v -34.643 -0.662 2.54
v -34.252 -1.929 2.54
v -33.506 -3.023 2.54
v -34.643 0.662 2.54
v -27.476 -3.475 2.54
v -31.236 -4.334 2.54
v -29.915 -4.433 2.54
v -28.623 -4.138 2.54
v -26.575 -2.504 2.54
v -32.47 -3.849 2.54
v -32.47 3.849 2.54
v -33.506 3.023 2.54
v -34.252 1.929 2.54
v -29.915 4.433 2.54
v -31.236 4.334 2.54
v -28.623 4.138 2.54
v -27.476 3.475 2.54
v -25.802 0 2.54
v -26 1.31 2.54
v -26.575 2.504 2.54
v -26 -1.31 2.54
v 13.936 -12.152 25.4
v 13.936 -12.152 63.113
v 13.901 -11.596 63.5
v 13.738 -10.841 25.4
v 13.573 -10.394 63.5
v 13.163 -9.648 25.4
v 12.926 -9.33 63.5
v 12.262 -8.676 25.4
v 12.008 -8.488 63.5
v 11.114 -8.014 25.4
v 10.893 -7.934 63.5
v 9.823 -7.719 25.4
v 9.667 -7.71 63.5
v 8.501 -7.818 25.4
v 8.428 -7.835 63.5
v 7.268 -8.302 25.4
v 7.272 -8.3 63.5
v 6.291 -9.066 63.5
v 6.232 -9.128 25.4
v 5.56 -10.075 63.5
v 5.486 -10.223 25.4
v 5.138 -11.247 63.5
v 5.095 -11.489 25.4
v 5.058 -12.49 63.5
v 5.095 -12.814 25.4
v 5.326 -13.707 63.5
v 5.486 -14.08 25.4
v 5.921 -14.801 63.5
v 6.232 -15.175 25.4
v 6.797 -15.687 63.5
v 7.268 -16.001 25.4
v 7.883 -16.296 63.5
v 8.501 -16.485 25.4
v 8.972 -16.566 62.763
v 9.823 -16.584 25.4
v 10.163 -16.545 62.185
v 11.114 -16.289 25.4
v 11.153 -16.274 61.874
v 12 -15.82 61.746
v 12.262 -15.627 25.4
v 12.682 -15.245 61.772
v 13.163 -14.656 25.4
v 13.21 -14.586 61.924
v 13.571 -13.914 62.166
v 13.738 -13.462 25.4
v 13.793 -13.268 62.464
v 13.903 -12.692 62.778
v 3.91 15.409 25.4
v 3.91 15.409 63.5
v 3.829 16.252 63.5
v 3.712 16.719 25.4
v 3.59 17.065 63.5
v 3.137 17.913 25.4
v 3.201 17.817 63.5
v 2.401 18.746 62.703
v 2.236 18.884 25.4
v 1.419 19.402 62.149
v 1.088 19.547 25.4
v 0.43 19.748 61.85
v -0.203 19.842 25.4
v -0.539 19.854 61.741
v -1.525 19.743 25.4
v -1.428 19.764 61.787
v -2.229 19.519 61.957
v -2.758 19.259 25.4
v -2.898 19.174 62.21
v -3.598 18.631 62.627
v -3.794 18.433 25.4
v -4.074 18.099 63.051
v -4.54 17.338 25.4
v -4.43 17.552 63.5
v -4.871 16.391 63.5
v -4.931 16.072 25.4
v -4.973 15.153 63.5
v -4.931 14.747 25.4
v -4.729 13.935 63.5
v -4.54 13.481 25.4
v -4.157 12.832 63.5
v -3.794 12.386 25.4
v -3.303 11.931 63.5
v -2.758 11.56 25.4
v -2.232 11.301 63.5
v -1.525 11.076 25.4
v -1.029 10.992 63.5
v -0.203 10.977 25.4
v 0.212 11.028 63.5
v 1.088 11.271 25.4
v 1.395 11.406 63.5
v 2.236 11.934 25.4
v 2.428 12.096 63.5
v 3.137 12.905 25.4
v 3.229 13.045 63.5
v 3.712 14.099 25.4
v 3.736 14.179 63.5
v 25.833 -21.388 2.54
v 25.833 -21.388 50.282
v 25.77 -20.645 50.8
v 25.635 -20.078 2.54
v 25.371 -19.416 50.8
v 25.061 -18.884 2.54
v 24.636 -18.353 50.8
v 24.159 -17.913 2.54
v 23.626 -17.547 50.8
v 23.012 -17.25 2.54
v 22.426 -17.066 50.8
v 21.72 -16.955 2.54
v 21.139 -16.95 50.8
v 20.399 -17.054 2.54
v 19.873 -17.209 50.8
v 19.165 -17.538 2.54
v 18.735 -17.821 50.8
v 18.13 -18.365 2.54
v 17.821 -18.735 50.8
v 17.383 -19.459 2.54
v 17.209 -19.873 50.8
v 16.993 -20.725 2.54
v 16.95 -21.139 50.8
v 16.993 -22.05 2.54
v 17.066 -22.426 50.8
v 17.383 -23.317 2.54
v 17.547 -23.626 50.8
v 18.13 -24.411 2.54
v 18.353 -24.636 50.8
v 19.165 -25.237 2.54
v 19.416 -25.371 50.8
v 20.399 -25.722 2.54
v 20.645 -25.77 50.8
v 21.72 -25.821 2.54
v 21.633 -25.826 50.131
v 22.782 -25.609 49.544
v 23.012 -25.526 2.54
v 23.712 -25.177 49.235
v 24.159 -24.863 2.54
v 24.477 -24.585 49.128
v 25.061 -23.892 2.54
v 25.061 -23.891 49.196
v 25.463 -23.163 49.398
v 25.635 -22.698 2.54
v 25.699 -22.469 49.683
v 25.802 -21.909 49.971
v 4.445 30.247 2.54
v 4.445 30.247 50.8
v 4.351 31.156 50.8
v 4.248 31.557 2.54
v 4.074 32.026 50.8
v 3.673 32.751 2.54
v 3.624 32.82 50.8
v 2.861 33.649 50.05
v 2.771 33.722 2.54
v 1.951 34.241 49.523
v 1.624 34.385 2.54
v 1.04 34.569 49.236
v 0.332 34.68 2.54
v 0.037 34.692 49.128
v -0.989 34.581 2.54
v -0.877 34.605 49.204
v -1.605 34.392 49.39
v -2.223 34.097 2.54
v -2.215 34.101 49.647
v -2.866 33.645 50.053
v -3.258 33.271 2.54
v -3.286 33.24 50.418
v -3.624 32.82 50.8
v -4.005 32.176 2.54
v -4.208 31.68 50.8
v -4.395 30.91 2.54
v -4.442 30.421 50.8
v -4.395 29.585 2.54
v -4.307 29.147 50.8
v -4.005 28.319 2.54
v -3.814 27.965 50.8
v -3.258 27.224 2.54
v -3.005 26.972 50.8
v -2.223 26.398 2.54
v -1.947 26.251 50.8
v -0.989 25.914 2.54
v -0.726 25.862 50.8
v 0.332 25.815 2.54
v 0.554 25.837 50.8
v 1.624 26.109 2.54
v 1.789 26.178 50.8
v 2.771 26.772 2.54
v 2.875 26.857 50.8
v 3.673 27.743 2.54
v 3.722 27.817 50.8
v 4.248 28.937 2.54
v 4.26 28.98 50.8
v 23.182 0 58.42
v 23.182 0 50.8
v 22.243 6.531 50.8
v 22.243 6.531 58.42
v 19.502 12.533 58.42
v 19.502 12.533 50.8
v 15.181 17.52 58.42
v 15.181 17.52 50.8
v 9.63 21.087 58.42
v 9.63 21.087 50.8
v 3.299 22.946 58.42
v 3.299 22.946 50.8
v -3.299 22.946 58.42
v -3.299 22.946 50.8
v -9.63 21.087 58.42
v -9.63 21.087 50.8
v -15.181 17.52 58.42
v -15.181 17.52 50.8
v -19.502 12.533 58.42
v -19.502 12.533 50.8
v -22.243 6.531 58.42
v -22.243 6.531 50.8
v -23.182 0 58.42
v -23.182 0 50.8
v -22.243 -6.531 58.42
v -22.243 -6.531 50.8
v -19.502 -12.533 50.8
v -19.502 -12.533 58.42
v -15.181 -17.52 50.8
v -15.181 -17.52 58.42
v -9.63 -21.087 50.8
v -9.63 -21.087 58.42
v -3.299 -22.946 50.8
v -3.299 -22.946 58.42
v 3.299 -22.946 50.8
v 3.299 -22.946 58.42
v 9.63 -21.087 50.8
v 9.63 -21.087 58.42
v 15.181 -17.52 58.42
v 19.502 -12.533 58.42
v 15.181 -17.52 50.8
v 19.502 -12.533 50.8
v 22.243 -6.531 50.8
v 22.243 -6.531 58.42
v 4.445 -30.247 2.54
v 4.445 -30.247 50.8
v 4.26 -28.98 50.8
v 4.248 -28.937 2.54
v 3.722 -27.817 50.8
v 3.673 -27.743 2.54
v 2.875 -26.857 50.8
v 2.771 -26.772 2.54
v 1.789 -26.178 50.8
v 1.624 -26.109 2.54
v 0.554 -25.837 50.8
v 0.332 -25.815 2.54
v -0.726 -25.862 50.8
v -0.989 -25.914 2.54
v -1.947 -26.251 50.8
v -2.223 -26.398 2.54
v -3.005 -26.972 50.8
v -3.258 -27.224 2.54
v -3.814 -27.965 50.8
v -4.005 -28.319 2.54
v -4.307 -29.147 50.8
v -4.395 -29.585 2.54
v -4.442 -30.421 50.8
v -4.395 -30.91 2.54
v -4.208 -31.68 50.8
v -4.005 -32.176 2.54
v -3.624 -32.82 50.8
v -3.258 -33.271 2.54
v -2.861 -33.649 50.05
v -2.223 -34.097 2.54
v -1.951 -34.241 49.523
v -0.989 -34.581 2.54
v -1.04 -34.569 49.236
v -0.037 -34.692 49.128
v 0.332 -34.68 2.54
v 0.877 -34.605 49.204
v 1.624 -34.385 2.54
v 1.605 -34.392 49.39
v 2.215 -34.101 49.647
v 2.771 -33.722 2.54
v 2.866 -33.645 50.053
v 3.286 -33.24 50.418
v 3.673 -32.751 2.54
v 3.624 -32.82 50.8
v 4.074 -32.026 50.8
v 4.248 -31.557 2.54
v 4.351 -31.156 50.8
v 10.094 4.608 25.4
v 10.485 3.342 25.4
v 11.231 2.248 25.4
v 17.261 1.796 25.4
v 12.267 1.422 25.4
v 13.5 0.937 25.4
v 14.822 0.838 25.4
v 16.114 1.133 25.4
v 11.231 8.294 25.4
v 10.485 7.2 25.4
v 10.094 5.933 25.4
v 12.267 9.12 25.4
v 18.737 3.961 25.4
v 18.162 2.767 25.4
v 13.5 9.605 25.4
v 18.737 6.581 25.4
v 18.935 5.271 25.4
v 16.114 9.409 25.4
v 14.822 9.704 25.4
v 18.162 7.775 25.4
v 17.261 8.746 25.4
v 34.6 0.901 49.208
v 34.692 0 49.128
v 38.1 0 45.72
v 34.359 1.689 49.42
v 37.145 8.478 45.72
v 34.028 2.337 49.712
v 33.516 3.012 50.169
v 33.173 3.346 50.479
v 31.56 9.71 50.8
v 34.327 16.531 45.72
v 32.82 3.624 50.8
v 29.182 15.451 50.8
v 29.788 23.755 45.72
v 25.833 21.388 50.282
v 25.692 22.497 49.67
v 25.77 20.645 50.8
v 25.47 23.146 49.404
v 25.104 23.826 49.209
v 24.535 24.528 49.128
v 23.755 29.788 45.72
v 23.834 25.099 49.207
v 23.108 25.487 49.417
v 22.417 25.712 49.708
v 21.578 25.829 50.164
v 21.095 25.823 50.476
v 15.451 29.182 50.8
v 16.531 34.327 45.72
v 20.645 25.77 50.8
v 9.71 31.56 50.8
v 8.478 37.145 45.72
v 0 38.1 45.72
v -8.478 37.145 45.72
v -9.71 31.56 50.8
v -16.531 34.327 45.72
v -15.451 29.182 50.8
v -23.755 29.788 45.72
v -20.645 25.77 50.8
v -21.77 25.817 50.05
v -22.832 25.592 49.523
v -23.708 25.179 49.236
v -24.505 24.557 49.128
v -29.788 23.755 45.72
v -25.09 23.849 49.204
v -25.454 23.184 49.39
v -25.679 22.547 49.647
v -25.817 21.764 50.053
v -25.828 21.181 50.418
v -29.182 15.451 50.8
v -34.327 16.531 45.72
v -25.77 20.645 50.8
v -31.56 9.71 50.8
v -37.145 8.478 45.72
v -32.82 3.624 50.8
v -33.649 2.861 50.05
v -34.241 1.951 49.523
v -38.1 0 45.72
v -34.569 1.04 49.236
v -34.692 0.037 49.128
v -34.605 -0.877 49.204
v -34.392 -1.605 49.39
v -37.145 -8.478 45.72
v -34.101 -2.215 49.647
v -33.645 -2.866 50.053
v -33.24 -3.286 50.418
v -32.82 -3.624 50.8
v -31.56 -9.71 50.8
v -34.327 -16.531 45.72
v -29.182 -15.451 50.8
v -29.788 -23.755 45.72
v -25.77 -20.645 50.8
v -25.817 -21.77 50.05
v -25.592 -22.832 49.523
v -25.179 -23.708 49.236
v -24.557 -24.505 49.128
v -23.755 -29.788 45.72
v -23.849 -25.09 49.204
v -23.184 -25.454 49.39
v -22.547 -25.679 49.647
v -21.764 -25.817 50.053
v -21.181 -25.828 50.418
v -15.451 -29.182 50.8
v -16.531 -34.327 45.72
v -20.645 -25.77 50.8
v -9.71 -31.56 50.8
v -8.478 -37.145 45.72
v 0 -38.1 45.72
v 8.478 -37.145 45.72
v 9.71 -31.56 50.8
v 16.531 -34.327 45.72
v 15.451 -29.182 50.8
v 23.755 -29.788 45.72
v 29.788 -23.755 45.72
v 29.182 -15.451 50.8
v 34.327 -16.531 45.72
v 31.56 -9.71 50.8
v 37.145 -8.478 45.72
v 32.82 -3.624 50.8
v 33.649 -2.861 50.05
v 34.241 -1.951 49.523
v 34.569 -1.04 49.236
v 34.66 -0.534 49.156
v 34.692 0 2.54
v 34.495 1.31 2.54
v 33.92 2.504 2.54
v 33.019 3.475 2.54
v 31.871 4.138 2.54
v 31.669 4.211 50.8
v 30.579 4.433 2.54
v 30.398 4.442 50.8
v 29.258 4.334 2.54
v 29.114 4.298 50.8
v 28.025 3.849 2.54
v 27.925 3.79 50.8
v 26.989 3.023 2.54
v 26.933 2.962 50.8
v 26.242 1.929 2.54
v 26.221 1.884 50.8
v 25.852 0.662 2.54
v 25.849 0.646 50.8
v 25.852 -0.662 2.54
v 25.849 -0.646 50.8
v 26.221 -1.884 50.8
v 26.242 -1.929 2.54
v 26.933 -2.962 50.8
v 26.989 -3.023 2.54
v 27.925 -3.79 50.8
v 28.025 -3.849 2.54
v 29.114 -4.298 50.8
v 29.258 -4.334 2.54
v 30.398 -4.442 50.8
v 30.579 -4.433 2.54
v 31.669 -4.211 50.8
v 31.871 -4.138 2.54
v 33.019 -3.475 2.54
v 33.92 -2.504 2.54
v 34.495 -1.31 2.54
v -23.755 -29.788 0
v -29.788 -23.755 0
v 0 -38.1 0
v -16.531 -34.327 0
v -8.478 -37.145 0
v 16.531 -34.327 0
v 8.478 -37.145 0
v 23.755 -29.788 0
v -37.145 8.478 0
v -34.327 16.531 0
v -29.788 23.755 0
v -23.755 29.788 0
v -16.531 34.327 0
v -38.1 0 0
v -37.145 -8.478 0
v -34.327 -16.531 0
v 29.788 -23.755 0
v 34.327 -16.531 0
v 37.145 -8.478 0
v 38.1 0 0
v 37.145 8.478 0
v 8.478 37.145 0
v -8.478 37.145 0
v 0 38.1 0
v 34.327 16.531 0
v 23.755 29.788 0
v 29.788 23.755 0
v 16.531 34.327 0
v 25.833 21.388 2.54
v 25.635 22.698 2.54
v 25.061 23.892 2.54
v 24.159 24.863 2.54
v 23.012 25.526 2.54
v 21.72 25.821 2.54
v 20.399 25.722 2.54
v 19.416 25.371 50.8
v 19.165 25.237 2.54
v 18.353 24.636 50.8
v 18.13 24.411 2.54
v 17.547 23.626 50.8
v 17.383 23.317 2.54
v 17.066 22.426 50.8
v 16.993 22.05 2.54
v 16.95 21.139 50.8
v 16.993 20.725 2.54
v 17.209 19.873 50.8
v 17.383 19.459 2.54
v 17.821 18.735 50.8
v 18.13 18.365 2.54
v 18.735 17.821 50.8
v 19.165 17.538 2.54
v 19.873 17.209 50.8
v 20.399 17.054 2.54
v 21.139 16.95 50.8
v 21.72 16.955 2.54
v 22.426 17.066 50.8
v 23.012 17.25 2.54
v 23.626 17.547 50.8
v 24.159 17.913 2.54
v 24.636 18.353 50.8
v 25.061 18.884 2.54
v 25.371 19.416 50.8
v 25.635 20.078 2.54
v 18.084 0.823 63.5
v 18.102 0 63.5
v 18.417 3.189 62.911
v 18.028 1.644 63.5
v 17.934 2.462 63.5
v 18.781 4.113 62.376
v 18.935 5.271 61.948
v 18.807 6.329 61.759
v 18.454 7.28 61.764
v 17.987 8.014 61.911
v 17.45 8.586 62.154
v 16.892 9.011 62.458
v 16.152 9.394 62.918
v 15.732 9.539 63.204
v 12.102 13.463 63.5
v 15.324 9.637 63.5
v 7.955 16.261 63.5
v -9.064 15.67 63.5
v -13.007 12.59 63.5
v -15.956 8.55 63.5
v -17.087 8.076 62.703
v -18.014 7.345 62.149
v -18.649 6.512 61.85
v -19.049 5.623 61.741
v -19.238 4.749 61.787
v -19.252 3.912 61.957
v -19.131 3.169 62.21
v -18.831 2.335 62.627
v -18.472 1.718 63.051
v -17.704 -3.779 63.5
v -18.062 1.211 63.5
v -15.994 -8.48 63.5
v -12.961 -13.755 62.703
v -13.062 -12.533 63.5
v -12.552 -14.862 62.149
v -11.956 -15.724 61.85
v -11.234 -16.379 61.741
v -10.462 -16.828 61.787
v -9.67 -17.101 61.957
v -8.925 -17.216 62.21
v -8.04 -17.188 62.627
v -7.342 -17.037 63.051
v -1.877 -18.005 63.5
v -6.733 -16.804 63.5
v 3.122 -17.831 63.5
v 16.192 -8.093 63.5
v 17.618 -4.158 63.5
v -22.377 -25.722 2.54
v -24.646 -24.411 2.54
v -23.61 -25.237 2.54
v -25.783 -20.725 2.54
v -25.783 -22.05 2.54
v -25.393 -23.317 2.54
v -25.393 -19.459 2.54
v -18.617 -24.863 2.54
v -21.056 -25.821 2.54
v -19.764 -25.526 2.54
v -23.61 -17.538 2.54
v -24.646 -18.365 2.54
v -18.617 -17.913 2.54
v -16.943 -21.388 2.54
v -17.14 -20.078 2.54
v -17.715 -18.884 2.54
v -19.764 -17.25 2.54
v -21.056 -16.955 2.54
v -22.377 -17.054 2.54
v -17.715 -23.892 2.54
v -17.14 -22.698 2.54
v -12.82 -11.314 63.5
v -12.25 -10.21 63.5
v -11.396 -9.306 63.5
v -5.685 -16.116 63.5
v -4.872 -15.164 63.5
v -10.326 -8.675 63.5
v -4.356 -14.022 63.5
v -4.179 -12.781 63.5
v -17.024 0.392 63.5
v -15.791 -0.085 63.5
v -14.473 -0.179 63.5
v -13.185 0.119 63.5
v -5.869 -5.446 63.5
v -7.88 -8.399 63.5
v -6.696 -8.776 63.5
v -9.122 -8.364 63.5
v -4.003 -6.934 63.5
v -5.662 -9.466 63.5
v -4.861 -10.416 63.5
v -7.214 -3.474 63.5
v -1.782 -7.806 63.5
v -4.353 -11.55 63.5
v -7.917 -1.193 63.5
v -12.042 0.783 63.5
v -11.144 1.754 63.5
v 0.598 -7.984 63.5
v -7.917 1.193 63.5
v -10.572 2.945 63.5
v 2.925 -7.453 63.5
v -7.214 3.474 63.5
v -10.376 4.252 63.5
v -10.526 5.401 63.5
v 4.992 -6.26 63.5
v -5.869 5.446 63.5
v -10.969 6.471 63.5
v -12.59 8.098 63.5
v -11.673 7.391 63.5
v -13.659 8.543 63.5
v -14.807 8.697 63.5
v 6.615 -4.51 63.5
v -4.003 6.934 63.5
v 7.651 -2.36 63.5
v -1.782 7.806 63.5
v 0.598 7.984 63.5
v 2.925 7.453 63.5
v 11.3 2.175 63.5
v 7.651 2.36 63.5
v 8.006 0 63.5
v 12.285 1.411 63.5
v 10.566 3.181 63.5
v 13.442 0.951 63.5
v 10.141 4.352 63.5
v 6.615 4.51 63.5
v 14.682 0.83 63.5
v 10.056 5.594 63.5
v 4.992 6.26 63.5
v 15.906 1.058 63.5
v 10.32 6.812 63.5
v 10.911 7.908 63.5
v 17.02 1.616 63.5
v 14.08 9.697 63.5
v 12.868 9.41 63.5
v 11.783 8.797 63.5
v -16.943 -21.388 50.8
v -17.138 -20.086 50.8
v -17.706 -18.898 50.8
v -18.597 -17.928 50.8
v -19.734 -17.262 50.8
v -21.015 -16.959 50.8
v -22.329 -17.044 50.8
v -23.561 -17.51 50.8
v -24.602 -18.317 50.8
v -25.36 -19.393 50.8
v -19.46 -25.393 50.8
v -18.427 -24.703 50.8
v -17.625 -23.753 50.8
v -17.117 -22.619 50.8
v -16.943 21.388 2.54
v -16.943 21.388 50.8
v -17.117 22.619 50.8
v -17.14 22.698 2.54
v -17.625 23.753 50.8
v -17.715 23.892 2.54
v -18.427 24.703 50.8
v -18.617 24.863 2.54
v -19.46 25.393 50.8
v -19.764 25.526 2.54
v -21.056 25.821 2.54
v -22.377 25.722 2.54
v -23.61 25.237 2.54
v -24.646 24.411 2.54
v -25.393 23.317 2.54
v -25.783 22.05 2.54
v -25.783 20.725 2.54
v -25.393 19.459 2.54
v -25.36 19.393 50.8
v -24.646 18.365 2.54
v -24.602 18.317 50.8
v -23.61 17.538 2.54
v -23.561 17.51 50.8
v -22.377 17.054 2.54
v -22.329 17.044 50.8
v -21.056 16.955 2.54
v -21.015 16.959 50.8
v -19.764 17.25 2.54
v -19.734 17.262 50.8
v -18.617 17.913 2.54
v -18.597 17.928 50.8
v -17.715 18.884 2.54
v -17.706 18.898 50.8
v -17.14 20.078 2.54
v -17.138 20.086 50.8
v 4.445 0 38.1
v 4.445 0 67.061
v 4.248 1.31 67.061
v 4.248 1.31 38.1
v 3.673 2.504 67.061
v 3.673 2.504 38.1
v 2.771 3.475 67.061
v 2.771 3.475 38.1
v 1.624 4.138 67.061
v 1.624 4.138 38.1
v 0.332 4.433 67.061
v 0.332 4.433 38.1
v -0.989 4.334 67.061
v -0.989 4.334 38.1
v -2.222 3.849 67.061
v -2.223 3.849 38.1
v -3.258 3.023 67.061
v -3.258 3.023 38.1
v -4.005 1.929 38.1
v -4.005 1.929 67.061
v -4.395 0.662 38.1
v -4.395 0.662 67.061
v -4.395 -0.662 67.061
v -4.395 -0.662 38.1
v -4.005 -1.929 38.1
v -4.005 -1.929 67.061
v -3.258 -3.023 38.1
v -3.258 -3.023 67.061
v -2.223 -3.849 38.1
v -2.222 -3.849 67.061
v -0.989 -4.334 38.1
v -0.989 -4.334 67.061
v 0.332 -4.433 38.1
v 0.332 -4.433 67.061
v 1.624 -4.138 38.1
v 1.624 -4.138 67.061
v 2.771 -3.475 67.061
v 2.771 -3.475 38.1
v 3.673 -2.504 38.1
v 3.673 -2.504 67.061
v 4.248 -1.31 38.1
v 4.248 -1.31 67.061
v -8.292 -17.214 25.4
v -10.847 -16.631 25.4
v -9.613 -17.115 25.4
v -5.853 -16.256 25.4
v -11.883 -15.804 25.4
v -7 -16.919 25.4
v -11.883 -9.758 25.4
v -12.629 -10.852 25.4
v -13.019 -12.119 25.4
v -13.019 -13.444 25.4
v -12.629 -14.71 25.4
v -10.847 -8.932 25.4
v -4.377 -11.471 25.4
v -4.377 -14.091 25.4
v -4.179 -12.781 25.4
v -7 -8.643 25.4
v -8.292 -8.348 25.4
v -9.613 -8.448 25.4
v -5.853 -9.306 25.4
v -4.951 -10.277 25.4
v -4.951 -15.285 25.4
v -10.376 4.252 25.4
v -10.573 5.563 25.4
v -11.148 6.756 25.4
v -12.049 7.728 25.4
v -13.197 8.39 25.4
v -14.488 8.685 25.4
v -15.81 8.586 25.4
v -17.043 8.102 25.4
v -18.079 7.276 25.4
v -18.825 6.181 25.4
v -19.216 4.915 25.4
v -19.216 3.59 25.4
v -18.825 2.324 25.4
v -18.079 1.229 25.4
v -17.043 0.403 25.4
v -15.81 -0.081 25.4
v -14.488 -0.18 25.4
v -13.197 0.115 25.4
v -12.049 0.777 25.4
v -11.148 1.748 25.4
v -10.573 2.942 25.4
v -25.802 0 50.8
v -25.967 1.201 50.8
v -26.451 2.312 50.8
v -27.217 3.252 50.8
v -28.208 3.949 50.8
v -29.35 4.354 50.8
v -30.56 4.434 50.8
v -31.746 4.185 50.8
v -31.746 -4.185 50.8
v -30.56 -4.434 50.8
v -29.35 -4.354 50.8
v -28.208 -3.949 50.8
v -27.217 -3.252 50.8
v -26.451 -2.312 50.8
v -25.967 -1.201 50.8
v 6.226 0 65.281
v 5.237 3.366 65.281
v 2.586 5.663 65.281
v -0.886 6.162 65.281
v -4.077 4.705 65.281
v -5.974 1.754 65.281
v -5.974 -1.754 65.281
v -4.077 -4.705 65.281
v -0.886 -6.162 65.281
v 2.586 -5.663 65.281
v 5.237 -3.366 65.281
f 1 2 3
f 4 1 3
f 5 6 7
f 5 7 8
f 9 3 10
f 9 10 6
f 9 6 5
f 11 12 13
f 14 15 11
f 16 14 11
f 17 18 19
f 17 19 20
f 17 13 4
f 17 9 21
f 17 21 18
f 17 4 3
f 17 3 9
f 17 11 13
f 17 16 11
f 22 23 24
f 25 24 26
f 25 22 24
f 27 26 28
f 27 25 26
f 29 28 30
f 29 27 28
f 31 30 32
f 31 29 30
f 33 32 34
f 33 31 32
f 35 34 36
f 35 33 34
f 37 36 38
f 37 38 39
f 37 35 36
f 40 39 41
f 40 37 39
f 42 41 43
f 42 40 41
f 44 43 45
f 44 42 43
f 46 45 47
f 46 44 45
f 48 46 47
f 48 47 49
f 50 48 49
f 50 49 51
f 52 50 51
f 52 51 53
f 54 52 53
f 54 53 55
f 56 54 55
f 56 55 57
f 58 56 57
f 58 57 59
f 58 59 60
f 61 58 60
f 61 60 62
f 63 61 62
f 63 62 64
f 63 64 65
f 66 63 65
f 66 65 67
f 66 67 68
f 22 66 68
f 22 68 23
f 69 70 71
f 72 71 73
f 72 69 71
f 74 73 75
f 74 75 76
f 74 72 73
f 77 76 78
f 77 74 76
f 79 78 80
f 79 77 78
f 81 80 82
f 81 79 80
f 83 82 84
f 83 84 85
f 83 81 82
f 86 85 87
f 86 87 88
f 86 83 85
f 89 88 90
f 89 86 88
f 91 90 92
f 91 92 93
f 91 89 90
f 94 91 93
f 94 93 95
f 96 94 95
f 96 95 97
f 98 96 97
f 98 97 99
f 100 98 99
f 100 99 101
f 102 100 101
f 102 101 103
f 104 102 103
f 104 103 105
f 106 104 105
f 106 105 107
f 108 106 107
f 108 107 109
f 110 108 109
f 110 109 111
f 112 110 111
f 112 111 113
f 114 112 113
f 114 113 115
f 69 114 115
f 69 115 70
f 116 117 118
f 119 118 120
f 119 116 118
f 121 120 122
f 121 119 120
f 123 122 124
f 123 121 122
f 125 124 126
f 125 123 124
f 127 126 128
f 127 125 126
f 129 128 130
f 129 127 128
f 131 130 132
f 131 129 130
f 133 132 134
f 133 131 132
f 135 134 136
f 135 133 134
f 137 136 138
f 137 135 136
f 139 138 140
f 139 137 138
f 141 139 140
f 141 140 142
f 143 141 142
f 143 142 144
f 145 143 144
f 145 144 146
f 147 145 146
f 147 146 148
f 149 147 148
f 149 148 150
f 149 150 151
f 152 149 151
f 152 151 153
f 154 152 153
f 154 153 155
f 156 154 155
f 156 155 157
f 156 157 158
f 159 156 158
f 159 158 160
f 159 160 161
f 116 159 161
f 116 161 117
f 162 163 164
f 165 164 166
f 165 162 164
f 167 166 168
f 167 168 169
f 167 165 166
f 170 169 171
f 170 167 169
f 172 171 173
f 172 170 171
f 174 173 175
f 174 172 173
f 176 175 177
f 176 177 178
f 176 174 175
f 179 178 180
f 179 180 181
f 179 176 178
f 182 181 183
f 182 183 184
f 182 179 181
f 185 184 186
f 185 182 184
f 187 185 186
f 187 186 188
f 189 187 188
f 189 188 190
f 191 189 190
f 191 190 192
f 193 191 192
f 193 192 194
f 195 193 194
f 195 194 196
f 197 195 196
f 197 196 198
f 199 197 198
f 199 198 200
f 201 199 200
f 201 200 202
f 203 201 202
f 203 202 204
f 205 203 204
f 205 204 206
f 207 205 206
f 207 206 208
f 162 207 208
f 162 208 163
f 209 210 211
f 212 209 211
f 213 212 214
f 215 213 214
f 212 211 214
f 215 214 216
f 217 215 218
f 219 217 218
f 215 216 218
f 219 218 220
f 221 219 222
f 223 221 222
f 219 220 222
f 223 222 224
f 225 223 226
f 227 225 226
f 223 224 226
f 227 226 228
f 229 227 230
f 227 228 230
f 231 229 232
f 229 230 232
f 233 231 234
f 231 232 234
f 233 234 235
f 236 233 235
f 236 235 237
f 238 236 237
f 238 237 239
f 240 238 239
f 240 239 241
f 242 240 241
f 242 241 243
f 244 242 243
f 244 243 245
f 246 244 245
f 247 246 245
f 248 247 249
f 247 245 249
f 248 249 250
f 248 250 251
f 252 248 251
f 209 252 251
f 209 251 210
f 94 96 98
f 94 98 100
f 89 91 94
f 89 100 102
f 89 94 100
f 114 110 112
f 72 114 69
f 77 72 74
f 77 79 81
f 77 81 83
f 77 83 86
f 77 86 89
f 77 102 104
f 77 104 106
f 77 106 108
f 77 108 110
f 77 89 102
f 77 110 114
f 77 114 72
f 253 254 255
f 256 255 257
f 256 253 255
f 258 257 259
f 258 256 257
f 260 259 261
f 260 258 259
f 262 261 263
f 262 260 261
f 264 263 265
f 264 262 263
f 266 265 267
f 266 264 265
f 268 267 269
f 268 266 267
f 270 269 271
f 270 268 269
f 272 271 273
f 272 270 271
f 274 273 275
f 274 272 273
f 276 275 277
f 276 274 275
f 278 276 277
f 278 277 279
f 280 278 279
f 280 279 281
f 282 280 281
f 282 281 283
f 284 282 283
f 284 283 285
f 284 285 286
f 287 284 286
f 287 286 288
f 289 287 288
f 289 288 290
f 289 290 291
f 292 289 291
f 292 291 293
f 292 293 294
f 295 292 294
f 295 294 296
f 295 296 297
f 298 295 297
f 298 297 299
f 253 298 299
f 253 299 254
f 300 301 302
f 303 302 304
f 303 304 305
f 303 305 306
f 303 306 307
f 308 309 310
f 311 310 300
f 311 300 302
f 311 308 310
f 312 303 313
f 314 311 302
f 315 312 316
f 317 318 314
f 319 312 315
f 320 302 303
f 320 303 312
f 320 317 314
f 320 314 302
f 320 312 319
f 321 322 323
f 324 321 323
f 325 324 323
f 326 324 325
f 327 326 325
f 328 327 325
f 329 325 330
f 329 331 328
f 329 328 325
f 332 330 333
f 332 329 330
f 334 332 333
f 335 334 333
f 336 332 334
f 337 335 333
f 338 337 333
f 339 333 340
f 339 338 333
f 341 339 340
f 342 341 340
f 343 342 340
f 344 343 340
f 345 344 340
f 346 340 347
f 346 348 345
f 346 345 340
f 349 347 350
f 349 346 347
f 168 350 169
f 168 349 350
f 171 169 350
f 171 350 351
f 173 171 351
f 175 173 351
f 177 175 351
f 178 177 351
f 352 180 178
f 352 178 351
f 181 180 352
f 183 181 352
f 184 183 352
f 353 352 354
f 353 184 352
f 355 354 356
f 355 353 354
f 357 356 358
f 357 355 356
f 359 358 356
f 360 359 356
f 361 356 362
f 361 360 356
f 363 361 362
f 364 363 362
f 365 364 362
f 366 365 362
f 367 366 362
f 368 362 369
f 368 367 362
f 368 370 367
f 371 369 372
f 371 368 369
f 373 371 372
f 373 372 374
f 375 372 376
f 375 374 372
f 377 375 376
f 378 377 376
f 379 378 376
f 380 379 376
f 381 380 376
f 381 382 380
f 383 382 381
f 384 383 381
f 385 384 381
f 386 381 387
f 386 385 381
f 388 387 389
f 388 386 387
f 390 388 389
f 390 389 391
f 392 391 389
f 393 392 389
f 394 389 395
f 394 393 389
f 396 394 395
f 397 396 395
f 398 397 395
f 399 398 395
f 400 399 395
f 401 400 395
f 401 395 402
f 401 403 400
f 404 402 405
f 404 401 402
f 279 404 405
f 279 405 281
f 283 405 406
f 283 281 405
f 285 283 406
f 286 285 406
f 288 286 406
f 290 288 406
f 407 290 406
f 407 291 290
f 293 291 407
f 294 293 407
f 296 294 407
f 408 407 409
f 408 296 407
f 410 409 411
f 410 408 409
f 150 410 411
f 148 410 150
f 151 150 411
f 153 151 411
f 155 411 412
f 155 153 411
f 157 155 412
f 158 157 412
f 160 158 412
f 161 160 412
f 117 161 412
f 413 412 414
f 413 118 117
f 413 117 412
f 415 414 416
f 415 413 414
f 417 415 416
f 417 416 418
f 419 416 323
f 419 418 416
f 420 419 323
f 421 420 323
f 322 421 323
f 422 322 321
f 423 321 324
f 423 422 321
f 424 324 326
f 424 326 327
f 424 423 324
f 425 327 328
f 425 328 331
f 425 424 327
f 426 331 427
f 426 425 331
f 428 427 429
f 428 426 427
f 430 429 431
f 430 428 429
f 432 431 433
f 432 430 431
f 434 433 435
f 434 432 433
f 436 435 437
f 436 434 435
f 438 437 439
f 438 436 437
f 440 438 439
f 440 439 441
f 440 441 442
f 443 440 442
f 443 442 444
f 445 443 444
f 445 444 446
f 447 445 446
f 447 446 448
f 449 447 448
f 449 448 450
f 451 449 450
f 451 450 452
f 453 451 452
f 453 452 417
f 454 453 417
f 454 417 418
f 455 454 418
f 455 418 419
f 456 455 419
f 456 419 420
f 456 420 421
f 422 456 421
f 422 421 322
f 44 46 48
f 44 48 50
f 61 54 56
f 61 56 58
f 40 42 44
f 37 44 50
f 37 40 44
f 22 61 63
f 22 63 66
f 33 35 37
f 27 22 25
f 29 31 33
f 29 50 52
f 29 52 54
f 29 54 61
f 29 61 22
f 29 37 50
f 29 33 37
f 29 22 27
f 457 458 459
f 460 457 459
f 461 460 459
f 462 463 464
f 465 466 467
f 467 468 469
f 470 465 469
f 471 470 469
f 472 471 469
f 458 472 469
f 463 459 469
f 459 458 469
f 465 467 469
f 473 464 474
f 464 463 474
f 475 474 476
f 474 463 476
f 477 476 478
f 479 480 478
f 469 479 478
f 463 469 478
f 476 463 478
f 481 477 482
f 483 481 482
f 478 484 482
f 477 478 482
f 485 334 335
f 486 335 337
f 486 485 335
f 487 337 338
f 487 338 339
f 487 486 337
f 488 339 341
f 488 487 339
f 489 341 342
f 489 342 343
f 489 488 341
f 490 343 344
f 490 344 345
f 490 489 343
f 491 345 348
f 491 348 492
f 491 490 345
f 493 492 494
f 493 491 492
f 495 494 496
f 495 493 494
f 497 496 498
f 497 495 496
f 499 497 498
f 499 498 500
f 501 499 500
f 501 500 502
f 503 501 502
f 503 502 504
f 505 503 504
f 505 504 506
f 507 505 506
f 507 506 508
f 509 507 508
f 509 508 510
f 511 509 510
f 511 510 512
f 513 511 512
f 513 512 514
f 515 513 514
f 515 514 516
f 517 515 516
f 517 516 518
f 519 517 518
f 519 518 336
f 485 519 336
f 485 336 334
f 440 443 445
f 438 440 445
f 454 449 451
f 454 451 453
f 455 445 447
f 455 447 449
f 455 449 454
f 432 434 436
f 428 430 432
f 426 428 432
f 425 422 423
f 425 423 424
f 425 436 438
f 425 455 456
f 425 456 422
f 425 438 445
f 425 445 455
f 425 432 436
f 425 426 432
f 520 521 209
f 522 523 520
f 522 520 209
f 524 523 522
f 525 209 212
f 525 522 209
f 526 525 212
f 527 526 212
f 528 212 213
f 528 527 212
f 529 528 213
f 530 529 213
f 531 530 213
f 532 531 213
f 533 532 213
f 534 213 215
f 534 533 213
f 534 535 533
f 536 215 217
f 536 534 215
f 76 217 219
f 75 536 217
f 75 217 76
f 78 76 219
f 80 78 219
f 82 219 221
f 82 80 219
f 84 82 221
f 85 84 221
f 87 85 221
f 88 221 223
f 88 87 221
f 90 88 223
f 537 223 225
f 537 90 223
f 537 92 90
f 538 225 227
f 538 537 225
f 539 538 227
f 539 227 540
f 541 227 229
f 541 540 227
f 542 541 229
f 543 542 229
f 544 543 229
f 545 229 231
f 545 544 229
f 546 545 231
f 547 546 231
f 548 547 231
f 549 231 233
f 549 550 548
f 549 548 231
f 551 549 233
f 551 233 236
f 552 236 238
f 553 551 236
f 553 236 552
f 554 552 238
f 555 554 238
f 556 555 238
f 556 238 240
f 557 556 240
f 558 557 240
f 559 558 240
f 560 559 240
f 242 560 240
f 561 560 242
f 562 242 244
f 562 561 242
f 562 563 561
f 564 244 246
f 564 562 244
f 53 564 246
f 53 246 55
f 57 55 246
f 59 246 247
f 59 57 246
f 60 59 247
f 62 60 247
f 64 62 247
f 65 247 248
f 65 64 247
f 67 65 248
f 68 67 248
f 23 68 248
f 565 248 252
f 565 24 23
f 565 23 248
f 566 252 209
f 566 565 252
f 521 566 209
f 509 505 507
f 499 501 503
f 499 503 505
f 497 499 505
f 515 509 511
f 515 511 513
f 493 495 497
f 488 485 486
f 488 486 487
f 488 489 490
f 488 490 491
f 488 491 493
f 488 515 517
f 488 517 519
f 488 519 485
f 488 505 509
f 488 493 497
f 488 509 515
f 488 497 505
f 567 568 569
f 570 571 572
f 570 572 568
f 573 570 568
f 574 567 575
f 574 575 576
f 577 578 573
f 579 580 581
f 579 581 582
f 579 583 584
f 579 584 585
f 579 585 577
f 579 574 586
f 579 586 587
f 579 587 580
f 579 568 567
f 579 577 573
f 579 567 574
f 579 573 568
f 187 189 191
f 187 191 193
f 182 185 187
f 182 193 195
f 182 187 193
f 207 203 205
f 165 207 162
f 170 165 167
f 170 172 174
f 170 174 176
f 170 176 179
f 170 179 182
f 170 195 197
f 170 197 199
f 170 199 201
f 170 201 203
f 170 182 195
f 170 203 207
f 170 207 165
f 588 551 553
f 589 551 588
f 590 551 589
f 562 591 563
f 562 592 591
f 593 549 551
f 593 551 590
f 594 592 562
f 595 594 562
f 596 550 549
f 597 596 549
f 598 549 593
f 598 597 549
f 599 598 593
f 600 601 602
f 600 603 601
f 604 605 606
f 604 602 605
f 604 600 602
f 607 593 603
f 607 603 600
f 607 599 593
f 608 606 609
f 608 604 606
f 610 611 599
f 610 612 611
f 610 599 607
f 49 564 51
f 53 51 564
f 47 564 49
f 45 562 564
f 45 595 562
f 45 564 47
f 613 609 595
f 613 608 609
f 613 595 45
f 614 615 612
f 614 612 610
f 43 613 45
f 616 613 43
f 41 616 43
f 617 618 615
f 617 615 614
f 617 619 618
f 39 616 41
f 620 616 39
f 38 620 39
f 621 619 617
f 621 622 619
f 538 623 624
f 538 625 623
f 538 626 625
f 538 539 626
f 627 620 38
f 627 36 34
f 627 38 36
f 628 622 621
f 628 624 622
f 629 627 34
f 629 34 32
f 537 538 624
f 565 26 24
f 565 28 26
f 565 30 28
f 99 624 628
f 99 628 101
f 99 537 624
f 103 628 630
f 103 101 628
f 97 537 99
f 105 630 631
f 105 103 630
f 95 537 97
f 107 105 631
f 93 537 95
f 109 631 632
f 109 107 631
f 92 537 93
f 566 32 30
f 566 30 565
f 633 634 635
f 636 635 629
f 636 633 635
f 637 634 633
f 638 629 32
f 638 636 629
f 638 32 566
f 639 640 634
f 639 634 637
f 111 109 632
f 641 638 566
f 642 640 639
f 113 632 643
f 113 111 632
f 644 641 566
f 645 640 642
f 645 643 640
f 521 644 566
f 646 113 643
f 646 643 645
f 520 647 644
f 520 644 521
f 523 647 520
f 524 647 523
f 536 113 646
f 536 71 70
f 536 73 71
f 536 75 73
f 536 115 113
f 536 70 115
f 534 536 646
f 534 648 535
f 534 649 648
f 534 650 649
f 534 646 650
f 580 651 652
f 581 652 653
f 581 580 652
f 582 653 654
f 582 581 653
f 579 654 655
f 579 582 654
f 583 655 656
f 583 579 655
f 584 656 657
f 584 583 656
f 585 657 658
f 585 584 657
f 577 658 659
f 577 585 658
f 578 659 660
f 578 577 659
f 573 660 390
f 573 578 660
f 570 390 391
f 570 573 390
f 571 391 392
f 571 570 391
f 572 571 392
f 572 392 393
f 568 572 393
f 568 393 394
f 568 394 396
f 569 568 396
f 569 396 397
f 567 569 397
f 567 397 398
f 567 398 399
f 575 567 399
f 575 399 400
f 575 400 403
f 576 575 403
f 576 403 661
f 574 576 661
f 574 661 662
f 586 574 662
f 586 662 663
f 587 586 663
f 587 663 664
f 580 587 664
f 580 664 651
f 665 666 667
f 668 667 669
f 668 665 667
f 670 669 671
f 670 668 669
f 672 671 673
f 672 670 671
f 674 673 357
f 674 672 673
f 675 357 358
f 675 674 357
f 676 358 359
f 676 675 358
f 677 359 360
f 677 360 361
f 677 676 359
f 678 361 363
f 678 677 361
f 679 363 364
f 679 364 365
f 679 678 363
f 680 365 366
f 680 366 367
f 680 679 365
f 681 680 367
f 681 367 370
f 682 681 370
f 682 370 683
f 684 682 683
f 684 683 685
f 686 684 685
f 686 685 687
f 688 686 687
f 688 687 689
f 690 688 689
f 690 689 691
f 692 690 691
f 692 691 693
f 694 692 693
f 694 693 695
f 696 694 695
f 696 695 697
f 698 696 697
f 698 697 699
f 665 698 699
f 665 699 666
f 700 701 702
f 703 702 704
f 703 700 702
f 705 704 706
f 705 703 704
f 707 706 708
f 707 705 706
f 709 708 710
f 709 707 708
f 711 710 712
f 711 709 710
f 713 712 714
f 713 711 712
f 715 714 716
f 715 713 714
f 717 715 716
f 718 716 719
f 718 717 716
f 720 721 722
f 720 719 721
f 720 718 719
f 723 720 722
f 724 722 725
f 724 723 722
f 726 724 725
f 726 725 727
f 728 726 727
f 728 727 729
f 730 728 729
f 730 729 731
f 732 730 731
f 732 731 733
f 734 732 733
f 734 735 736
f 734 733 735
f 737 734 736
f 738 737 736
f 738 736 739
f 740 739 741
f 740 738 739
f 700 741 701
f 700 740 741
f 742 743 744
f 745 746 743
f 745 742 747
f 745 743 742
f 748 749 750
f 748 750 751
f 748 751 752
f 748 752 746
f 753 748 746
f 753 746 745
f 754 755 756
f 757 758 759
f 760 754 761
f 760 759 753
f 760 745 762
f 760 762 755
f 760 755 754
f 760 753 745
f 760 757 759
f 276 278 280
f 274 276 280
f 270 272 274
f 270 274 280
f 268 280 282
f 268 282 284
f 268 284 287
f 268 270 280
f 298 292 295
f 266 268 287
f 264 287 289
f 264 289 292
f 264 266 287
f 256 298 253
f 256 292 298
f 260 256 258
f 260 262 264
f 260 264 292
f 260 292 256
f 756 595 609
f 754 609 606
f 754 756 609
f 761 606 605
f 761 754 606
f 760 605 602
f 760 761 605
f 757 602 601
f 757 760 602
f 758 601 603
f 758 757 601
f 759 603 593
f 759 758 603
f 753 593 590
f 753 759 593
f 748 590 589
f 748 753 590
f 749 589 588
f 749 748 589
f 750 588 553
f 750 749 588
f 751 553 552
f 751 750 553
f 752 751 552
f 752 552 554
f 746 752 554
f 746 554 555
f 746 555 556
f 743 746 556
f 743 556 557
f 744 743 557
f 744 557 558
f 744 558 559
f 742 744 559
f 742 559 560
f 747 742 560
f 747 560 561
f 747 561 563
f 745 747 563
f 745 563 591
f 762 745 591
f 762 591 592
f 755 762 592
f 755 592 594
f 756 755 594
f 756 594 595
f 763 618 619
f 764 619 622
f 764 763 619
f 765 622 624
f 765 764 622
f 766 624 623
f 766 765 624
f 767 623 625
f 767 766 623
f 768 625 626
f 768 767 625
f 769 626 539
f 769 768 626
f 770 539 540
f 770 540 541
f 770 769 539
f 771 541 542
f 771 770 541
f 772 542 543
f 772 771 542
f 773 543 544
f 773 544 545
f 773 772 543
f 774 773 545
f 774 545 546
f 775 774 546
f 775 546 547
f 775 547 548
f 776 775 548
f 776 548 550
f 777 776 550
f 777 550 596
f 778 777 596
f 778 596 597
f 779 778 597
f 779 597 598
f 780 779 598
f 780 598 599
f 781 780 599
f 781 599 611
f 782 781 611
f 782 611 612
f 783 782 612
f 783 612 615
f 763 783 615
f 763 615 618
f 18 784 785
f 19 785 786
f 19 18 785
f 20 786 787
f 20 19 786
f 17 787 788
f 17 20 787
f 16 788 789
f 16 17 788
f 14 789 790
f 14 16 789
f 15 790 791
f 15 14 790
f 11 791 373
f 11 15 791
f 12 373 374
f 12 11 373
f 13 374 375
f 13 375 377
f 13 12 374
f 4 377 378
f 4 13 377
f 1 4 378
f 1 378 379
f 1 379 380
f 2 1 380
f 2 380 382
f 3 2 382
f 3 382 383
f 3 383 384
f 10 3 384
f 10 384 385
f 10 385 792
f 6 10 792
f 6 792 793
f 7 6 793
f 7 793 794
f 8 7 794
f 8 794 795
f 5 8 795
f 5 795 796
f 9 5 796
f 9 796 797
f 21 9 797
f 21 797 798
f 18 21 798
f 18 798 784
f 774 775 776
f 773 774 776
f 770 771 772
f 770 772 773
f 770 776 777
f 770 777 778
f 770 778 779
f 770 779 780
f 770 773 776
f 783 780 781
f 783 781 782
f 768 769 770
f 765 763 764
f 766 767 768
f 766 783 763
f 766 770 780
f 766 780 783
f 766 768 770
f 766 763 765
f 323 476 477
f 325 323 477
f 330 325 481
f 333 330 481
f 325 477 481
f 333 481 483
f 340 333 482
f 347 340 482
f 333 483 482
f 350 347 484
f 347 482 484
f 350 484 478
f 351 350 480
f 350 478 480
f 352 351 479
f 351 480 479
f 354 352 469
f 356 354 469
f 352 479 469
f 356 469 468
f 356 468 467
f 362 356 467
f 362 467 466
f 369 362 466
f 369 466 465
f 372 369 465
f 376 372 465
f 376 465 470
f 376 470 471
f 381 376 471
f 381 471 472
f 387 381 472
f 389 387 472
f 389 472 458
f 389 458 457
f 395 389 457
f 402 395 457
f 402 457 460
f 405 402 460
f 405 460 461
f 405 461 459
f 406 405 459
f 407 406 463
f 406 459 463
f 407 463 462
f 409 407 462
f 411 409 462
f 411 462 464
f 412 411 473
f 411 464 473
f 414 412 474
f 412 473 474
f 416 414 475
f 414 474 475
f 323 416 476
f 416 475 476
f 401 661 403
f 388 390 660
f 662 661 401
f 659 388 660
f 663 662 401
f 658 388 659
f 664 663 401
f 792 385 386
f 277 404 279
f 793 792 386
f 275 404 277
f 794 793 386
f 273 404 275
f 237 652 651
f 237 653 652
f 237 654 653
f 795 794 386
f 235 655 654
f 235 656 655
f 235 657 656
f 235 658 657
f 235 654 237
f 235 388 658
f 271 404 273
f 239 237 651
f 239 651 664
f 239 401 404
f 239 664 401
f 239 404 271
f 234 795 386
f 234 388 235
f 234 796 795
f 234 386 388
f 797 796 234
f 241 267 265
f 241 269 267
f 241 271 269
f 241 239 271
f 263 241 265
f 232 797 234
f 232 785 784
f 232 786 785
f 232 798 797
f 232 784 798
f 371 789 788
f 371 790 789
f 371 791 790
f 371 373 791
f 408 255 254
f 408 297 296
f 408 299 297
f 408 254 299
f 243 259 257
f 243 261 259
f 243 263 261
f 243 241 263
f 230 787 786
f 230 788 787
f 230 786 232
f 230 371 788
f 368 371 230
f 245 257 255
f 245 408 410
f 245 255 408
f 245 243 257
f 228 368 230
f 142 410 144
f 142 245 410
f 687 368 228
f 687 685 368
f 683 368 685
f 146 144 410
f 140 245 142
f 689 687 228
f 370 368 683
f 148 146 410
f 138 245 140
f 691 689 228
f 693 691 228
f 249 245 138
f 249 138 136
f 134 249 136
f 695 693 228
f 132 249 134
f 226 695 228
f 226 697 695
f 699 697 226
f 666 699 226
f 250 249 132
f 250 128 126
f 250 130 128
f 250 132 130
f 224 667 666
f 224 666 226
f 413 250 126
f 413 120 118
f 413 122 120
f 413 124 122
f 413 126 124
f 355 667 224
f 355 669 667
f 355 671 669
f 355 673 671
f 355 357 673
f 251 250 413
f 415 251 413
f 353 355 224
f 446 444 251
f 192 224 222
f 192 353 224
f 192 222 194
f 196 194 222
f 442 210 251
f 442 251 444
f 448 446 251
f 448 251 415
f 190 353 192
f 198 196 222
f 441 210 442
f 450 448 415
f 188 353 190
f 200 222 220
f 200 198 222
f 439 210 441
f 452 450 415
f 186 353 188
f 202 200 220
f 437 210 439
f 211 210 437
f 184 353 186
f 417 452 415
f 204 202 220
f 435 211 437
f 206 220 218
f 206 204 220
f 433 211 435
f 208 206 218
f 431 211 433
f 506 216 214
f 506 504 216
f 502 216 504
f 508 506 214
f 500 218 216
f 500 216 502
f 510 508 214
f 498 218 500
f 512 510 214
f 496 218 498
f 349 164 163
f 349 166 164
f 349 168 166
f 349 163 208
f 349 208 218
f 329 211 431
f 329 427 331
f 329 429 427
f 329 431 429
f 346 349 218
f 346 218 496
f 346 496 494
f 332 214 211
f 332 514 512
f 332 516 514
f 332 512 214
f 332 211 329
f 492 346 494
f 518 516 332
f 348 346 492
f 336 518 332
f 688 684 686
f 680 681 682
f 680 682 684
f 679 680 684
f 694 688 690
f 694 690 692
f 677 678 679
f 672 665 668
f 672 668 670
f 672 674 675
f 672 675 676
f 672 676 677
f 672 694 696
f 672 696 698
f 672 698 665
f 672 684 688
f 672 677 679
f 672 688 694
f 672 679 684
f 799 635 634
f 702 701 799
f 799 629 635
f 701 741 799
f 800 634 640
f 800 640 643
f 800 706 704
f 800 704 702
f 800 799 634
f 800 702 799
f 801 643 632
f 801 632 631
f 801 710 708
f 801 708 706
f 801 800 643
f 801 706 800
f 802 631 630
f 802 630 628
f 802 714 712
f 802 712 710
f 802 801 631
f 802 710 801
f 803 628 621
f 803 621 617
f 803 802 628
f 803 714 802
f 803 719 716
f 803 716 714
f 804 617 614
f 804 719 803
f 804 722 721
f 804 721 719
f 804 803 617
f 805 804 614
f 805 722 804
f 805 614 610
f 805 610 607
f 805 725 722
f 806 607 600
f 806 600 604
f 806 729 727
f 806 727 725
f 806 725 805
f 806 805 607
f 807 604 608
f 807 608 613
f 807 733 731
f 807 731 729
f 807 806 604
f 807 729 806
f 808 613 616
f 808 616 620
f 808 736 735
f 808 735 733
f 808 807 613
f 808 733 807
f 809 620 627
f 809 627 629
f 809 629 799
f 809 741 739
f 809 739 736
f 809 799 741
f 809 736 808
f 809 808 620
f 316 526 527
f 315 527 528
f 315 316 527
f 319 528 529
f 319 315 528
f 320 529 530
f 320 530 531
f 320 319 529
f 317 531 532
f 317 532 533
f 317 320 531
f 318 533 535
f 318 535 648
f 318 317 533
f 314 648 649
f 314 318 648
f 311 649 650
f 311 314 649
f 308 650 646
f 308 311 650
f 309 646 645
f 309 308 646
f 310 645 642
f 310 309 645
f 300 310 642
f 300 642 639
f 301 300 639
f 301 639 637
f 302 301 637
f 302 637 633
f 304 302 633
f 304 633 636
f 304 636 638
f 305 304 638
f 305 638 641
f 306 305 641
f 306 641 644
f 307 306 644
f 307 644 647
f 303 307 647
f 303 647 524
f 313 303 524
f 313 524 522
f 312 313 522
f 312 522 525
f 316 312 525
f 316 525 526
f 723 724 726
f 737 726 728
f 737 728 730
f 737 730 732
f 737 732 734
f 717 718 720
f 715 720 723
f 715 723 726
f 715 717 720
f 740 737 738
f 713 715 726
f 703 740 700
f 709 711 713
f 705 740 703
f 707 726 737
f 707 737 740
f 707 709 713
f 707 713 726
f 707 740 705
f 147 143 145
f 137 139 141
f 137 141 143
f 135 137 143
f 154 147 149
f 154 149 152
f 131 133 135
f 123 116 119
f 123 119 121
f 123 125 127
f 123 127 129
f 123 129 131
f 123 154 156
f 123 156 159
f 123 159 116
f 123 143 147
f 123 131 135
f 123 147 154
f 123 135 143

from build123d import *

# Parameters (mm, degrees)
F0_R     = 38.1
F0_R_2   = 4.445
F0_R_3   = 23.1824441608
F1_DEPTH = 50.8
F0_R_4   = 8.0064033383
F2_DEPTH = 63.5
F3_DEPTH = 68.58
F4_DEPTH = 2.54
F5_DEPTH = 25.4
F6_DEPTH = 38.1


# Not quite as in the source:
# - a fillet or chamfer that OpenCascade refuses, or shapes differently, is made with other operations: its cross-section is extruded or revolved along the edge and cut away or added


with BuildPart() as f1:
    # F0 (on Top) → F1 (new body)
    with BuildSketch(Plane.XY):
        Circle(F0_R)
        with Locations((-21.3879767226, -21.3879767226)):
            Circle(F0_R_2, mode=Mode.SUBTRACT)
        with Locations((0, -30.2471667528)):
            Circle(F0_R_2, mode=Mode.SUBTRACT)
        with Locations((21.3879767226, -21.3879767226)):
            Circle(F0_R_2, mode=Mode.SUBTRACT)
        with Locations((-30.2471667528, 0)):
            Circle(F0_R_2, mode=Mode.SUBTRACT)
        with Locations((-21.3879767226, 21.3879767226)):
            Circle(F0_R_2, mode=Mode.SUBTRACT)
        Circle(F0_R_3, mode=Mode.SUBTRACT)
        with Locations((30.2471667528, 0)):
            Circle(F0_R_2, mode=Mode.SUBTRACT)
        with Locations((0, 30.2471667528)):
            Circle(F0_R_2, mode=Mode.SUBTRACT)
        with Locations((21.3879767226, 21.3879767226)):
            Circle(F0_R_2, mode=Mode.SUBTRACT)
    extrude(amount=F1_DEPTH)

    # F0 (on Top) → F2 (join)
    with BuildSketch(Plane.XY):
        Circle(F0_R_3)
        with Locations((-8.6240968668, -12.7810694279)):
            Circle(F0_R_2, mode=Mode.SUBTRACT)
        with Locations((9.4905268716, -12.1515711819)):
            Circle(F0_R_2, mode=Mode.SUBTRACT)
        with Locations((-14.8205118576, 4.2524358628)):
            Circle(F0_R_2, mode=Mode.SUBTRACT)
        with Locations((-0.5354831918, 15.4092193261)):
            Circle(F0_R_2, mode=Mode.SUBTRACT)
        Circle(F0_R_4, mode=Mode.SUBTRACT)
        with Locations((14.4895650446, 5.2709854208)):
            Circle(F0_R_2, mode=Mode.SUBTRACT)
    extrude(amount=F2_DEPTH)

    # F0 (on Top) → F3 (join)
    with BuildSketch(Plane.XY):
        Circle(F0_R_4)
        Circle(F0_R_2, mode=Mode.SUBTRACT)
    extrude(amount=F3_DEPTH)

    # F0 (on Top) → F4 (join)
    with BuildSketch(Plane.XY):
        with Locations((-30.2471667528, 0)):
            Circle(F0_R_2)
        with Locations((-21.3879767226, -21.3879767226)):
            Circle(F0_R_2)
        with Locations((0, -30.2471667528)):
            Circle(F0_R_2)
        with Locations((21.3879767226, -21.3879767226)):
            Circle(F0_R_2)
        with Locations((21.3879767226, 21.3879767226)):
            Circle(F0_R_2)
        with Locations((0, 30.2471667528)):
            Circle(F0_R_2)
        with Locations((-21.3879767226, 21.3879767226)):
            Circle(F0_R_2)
        with Locations((30.2471667528, 0)):
            Circle(F0_R_2)
    extrude(amount=F4_DEPTH)

    # F0 (on Top) → F5 (join)
    with BuildSketch(Plane.XY):
        with Locations((-8.6240968668, -12.7810694279)):
            Circle(F0_R_2)
        with Locations((9.4905268716, -12.1515711819)):
            Circle(F0_R_2)
        with Locations((14.4895650446, 5.2709854208)):
            Circle(F0_R_2)
        with Locations((-0.5354831918, 15.4092193261)):
            Circle(F0_R_2)
        with Locations((-14.8205118576, 4.2524358628)):
            Circle(F0_R_2)
    extrude(amount=F5_DEPTH)

    # F0 (on Top) → F6 (join)
    with BuildSketch(Plane.XY):
        Circle(F0_R_2)
    extrude(amount=F6_DEPTH)

    # F7: chamfer of 5.08 on 3 edges, made by hand

    # F7_s1 → F7_t2 (revolve, cut)
    with BuildSketch(Plane.XZ):
        Polygon((38.1, 45.72), (33.02, 50.8), (38.1, 50.8), align=None)
    revolve(axis=Axis((0, 0, 50.8), (0, 0, 1)), mode=Mode.SUBTRACT)

    # F7_s3 → F7_t4 (revolve, cut)
    with BuildSketch(Plane.XZ):
        Polygon((23.1824441608, 58.42), (18.1024441608, 63.5), (23.1824441608, 63.5), align=None)
    revolve(axis=Axis((0, 0, 63.5), (0, 0, 1)), mode=Mode.SUBTRACT)


with BuildPart() as f7_tool6:
    # F7_s7 → F7_t8 (revolve)
    with BuildSketch(Plane.XZ):
        Polygon((8.0064033383, 63.5), (2.9264033383, 68.58), (8.0064033383, 68.58), align=None)
    revolve(axis=Axis((0, 0, 68.58), (0, 0, 1)))

    split(bisect_by=Plane.XY.offset(63.5), keep=Keep.TOP)


with BuildPart() as f1_1:
    add(f1.part)

    # F7_t5: cut F7_tool6
    add(f7_tool6.part, mode=Mode.SUBTRACT)


solid = f1_1.part
